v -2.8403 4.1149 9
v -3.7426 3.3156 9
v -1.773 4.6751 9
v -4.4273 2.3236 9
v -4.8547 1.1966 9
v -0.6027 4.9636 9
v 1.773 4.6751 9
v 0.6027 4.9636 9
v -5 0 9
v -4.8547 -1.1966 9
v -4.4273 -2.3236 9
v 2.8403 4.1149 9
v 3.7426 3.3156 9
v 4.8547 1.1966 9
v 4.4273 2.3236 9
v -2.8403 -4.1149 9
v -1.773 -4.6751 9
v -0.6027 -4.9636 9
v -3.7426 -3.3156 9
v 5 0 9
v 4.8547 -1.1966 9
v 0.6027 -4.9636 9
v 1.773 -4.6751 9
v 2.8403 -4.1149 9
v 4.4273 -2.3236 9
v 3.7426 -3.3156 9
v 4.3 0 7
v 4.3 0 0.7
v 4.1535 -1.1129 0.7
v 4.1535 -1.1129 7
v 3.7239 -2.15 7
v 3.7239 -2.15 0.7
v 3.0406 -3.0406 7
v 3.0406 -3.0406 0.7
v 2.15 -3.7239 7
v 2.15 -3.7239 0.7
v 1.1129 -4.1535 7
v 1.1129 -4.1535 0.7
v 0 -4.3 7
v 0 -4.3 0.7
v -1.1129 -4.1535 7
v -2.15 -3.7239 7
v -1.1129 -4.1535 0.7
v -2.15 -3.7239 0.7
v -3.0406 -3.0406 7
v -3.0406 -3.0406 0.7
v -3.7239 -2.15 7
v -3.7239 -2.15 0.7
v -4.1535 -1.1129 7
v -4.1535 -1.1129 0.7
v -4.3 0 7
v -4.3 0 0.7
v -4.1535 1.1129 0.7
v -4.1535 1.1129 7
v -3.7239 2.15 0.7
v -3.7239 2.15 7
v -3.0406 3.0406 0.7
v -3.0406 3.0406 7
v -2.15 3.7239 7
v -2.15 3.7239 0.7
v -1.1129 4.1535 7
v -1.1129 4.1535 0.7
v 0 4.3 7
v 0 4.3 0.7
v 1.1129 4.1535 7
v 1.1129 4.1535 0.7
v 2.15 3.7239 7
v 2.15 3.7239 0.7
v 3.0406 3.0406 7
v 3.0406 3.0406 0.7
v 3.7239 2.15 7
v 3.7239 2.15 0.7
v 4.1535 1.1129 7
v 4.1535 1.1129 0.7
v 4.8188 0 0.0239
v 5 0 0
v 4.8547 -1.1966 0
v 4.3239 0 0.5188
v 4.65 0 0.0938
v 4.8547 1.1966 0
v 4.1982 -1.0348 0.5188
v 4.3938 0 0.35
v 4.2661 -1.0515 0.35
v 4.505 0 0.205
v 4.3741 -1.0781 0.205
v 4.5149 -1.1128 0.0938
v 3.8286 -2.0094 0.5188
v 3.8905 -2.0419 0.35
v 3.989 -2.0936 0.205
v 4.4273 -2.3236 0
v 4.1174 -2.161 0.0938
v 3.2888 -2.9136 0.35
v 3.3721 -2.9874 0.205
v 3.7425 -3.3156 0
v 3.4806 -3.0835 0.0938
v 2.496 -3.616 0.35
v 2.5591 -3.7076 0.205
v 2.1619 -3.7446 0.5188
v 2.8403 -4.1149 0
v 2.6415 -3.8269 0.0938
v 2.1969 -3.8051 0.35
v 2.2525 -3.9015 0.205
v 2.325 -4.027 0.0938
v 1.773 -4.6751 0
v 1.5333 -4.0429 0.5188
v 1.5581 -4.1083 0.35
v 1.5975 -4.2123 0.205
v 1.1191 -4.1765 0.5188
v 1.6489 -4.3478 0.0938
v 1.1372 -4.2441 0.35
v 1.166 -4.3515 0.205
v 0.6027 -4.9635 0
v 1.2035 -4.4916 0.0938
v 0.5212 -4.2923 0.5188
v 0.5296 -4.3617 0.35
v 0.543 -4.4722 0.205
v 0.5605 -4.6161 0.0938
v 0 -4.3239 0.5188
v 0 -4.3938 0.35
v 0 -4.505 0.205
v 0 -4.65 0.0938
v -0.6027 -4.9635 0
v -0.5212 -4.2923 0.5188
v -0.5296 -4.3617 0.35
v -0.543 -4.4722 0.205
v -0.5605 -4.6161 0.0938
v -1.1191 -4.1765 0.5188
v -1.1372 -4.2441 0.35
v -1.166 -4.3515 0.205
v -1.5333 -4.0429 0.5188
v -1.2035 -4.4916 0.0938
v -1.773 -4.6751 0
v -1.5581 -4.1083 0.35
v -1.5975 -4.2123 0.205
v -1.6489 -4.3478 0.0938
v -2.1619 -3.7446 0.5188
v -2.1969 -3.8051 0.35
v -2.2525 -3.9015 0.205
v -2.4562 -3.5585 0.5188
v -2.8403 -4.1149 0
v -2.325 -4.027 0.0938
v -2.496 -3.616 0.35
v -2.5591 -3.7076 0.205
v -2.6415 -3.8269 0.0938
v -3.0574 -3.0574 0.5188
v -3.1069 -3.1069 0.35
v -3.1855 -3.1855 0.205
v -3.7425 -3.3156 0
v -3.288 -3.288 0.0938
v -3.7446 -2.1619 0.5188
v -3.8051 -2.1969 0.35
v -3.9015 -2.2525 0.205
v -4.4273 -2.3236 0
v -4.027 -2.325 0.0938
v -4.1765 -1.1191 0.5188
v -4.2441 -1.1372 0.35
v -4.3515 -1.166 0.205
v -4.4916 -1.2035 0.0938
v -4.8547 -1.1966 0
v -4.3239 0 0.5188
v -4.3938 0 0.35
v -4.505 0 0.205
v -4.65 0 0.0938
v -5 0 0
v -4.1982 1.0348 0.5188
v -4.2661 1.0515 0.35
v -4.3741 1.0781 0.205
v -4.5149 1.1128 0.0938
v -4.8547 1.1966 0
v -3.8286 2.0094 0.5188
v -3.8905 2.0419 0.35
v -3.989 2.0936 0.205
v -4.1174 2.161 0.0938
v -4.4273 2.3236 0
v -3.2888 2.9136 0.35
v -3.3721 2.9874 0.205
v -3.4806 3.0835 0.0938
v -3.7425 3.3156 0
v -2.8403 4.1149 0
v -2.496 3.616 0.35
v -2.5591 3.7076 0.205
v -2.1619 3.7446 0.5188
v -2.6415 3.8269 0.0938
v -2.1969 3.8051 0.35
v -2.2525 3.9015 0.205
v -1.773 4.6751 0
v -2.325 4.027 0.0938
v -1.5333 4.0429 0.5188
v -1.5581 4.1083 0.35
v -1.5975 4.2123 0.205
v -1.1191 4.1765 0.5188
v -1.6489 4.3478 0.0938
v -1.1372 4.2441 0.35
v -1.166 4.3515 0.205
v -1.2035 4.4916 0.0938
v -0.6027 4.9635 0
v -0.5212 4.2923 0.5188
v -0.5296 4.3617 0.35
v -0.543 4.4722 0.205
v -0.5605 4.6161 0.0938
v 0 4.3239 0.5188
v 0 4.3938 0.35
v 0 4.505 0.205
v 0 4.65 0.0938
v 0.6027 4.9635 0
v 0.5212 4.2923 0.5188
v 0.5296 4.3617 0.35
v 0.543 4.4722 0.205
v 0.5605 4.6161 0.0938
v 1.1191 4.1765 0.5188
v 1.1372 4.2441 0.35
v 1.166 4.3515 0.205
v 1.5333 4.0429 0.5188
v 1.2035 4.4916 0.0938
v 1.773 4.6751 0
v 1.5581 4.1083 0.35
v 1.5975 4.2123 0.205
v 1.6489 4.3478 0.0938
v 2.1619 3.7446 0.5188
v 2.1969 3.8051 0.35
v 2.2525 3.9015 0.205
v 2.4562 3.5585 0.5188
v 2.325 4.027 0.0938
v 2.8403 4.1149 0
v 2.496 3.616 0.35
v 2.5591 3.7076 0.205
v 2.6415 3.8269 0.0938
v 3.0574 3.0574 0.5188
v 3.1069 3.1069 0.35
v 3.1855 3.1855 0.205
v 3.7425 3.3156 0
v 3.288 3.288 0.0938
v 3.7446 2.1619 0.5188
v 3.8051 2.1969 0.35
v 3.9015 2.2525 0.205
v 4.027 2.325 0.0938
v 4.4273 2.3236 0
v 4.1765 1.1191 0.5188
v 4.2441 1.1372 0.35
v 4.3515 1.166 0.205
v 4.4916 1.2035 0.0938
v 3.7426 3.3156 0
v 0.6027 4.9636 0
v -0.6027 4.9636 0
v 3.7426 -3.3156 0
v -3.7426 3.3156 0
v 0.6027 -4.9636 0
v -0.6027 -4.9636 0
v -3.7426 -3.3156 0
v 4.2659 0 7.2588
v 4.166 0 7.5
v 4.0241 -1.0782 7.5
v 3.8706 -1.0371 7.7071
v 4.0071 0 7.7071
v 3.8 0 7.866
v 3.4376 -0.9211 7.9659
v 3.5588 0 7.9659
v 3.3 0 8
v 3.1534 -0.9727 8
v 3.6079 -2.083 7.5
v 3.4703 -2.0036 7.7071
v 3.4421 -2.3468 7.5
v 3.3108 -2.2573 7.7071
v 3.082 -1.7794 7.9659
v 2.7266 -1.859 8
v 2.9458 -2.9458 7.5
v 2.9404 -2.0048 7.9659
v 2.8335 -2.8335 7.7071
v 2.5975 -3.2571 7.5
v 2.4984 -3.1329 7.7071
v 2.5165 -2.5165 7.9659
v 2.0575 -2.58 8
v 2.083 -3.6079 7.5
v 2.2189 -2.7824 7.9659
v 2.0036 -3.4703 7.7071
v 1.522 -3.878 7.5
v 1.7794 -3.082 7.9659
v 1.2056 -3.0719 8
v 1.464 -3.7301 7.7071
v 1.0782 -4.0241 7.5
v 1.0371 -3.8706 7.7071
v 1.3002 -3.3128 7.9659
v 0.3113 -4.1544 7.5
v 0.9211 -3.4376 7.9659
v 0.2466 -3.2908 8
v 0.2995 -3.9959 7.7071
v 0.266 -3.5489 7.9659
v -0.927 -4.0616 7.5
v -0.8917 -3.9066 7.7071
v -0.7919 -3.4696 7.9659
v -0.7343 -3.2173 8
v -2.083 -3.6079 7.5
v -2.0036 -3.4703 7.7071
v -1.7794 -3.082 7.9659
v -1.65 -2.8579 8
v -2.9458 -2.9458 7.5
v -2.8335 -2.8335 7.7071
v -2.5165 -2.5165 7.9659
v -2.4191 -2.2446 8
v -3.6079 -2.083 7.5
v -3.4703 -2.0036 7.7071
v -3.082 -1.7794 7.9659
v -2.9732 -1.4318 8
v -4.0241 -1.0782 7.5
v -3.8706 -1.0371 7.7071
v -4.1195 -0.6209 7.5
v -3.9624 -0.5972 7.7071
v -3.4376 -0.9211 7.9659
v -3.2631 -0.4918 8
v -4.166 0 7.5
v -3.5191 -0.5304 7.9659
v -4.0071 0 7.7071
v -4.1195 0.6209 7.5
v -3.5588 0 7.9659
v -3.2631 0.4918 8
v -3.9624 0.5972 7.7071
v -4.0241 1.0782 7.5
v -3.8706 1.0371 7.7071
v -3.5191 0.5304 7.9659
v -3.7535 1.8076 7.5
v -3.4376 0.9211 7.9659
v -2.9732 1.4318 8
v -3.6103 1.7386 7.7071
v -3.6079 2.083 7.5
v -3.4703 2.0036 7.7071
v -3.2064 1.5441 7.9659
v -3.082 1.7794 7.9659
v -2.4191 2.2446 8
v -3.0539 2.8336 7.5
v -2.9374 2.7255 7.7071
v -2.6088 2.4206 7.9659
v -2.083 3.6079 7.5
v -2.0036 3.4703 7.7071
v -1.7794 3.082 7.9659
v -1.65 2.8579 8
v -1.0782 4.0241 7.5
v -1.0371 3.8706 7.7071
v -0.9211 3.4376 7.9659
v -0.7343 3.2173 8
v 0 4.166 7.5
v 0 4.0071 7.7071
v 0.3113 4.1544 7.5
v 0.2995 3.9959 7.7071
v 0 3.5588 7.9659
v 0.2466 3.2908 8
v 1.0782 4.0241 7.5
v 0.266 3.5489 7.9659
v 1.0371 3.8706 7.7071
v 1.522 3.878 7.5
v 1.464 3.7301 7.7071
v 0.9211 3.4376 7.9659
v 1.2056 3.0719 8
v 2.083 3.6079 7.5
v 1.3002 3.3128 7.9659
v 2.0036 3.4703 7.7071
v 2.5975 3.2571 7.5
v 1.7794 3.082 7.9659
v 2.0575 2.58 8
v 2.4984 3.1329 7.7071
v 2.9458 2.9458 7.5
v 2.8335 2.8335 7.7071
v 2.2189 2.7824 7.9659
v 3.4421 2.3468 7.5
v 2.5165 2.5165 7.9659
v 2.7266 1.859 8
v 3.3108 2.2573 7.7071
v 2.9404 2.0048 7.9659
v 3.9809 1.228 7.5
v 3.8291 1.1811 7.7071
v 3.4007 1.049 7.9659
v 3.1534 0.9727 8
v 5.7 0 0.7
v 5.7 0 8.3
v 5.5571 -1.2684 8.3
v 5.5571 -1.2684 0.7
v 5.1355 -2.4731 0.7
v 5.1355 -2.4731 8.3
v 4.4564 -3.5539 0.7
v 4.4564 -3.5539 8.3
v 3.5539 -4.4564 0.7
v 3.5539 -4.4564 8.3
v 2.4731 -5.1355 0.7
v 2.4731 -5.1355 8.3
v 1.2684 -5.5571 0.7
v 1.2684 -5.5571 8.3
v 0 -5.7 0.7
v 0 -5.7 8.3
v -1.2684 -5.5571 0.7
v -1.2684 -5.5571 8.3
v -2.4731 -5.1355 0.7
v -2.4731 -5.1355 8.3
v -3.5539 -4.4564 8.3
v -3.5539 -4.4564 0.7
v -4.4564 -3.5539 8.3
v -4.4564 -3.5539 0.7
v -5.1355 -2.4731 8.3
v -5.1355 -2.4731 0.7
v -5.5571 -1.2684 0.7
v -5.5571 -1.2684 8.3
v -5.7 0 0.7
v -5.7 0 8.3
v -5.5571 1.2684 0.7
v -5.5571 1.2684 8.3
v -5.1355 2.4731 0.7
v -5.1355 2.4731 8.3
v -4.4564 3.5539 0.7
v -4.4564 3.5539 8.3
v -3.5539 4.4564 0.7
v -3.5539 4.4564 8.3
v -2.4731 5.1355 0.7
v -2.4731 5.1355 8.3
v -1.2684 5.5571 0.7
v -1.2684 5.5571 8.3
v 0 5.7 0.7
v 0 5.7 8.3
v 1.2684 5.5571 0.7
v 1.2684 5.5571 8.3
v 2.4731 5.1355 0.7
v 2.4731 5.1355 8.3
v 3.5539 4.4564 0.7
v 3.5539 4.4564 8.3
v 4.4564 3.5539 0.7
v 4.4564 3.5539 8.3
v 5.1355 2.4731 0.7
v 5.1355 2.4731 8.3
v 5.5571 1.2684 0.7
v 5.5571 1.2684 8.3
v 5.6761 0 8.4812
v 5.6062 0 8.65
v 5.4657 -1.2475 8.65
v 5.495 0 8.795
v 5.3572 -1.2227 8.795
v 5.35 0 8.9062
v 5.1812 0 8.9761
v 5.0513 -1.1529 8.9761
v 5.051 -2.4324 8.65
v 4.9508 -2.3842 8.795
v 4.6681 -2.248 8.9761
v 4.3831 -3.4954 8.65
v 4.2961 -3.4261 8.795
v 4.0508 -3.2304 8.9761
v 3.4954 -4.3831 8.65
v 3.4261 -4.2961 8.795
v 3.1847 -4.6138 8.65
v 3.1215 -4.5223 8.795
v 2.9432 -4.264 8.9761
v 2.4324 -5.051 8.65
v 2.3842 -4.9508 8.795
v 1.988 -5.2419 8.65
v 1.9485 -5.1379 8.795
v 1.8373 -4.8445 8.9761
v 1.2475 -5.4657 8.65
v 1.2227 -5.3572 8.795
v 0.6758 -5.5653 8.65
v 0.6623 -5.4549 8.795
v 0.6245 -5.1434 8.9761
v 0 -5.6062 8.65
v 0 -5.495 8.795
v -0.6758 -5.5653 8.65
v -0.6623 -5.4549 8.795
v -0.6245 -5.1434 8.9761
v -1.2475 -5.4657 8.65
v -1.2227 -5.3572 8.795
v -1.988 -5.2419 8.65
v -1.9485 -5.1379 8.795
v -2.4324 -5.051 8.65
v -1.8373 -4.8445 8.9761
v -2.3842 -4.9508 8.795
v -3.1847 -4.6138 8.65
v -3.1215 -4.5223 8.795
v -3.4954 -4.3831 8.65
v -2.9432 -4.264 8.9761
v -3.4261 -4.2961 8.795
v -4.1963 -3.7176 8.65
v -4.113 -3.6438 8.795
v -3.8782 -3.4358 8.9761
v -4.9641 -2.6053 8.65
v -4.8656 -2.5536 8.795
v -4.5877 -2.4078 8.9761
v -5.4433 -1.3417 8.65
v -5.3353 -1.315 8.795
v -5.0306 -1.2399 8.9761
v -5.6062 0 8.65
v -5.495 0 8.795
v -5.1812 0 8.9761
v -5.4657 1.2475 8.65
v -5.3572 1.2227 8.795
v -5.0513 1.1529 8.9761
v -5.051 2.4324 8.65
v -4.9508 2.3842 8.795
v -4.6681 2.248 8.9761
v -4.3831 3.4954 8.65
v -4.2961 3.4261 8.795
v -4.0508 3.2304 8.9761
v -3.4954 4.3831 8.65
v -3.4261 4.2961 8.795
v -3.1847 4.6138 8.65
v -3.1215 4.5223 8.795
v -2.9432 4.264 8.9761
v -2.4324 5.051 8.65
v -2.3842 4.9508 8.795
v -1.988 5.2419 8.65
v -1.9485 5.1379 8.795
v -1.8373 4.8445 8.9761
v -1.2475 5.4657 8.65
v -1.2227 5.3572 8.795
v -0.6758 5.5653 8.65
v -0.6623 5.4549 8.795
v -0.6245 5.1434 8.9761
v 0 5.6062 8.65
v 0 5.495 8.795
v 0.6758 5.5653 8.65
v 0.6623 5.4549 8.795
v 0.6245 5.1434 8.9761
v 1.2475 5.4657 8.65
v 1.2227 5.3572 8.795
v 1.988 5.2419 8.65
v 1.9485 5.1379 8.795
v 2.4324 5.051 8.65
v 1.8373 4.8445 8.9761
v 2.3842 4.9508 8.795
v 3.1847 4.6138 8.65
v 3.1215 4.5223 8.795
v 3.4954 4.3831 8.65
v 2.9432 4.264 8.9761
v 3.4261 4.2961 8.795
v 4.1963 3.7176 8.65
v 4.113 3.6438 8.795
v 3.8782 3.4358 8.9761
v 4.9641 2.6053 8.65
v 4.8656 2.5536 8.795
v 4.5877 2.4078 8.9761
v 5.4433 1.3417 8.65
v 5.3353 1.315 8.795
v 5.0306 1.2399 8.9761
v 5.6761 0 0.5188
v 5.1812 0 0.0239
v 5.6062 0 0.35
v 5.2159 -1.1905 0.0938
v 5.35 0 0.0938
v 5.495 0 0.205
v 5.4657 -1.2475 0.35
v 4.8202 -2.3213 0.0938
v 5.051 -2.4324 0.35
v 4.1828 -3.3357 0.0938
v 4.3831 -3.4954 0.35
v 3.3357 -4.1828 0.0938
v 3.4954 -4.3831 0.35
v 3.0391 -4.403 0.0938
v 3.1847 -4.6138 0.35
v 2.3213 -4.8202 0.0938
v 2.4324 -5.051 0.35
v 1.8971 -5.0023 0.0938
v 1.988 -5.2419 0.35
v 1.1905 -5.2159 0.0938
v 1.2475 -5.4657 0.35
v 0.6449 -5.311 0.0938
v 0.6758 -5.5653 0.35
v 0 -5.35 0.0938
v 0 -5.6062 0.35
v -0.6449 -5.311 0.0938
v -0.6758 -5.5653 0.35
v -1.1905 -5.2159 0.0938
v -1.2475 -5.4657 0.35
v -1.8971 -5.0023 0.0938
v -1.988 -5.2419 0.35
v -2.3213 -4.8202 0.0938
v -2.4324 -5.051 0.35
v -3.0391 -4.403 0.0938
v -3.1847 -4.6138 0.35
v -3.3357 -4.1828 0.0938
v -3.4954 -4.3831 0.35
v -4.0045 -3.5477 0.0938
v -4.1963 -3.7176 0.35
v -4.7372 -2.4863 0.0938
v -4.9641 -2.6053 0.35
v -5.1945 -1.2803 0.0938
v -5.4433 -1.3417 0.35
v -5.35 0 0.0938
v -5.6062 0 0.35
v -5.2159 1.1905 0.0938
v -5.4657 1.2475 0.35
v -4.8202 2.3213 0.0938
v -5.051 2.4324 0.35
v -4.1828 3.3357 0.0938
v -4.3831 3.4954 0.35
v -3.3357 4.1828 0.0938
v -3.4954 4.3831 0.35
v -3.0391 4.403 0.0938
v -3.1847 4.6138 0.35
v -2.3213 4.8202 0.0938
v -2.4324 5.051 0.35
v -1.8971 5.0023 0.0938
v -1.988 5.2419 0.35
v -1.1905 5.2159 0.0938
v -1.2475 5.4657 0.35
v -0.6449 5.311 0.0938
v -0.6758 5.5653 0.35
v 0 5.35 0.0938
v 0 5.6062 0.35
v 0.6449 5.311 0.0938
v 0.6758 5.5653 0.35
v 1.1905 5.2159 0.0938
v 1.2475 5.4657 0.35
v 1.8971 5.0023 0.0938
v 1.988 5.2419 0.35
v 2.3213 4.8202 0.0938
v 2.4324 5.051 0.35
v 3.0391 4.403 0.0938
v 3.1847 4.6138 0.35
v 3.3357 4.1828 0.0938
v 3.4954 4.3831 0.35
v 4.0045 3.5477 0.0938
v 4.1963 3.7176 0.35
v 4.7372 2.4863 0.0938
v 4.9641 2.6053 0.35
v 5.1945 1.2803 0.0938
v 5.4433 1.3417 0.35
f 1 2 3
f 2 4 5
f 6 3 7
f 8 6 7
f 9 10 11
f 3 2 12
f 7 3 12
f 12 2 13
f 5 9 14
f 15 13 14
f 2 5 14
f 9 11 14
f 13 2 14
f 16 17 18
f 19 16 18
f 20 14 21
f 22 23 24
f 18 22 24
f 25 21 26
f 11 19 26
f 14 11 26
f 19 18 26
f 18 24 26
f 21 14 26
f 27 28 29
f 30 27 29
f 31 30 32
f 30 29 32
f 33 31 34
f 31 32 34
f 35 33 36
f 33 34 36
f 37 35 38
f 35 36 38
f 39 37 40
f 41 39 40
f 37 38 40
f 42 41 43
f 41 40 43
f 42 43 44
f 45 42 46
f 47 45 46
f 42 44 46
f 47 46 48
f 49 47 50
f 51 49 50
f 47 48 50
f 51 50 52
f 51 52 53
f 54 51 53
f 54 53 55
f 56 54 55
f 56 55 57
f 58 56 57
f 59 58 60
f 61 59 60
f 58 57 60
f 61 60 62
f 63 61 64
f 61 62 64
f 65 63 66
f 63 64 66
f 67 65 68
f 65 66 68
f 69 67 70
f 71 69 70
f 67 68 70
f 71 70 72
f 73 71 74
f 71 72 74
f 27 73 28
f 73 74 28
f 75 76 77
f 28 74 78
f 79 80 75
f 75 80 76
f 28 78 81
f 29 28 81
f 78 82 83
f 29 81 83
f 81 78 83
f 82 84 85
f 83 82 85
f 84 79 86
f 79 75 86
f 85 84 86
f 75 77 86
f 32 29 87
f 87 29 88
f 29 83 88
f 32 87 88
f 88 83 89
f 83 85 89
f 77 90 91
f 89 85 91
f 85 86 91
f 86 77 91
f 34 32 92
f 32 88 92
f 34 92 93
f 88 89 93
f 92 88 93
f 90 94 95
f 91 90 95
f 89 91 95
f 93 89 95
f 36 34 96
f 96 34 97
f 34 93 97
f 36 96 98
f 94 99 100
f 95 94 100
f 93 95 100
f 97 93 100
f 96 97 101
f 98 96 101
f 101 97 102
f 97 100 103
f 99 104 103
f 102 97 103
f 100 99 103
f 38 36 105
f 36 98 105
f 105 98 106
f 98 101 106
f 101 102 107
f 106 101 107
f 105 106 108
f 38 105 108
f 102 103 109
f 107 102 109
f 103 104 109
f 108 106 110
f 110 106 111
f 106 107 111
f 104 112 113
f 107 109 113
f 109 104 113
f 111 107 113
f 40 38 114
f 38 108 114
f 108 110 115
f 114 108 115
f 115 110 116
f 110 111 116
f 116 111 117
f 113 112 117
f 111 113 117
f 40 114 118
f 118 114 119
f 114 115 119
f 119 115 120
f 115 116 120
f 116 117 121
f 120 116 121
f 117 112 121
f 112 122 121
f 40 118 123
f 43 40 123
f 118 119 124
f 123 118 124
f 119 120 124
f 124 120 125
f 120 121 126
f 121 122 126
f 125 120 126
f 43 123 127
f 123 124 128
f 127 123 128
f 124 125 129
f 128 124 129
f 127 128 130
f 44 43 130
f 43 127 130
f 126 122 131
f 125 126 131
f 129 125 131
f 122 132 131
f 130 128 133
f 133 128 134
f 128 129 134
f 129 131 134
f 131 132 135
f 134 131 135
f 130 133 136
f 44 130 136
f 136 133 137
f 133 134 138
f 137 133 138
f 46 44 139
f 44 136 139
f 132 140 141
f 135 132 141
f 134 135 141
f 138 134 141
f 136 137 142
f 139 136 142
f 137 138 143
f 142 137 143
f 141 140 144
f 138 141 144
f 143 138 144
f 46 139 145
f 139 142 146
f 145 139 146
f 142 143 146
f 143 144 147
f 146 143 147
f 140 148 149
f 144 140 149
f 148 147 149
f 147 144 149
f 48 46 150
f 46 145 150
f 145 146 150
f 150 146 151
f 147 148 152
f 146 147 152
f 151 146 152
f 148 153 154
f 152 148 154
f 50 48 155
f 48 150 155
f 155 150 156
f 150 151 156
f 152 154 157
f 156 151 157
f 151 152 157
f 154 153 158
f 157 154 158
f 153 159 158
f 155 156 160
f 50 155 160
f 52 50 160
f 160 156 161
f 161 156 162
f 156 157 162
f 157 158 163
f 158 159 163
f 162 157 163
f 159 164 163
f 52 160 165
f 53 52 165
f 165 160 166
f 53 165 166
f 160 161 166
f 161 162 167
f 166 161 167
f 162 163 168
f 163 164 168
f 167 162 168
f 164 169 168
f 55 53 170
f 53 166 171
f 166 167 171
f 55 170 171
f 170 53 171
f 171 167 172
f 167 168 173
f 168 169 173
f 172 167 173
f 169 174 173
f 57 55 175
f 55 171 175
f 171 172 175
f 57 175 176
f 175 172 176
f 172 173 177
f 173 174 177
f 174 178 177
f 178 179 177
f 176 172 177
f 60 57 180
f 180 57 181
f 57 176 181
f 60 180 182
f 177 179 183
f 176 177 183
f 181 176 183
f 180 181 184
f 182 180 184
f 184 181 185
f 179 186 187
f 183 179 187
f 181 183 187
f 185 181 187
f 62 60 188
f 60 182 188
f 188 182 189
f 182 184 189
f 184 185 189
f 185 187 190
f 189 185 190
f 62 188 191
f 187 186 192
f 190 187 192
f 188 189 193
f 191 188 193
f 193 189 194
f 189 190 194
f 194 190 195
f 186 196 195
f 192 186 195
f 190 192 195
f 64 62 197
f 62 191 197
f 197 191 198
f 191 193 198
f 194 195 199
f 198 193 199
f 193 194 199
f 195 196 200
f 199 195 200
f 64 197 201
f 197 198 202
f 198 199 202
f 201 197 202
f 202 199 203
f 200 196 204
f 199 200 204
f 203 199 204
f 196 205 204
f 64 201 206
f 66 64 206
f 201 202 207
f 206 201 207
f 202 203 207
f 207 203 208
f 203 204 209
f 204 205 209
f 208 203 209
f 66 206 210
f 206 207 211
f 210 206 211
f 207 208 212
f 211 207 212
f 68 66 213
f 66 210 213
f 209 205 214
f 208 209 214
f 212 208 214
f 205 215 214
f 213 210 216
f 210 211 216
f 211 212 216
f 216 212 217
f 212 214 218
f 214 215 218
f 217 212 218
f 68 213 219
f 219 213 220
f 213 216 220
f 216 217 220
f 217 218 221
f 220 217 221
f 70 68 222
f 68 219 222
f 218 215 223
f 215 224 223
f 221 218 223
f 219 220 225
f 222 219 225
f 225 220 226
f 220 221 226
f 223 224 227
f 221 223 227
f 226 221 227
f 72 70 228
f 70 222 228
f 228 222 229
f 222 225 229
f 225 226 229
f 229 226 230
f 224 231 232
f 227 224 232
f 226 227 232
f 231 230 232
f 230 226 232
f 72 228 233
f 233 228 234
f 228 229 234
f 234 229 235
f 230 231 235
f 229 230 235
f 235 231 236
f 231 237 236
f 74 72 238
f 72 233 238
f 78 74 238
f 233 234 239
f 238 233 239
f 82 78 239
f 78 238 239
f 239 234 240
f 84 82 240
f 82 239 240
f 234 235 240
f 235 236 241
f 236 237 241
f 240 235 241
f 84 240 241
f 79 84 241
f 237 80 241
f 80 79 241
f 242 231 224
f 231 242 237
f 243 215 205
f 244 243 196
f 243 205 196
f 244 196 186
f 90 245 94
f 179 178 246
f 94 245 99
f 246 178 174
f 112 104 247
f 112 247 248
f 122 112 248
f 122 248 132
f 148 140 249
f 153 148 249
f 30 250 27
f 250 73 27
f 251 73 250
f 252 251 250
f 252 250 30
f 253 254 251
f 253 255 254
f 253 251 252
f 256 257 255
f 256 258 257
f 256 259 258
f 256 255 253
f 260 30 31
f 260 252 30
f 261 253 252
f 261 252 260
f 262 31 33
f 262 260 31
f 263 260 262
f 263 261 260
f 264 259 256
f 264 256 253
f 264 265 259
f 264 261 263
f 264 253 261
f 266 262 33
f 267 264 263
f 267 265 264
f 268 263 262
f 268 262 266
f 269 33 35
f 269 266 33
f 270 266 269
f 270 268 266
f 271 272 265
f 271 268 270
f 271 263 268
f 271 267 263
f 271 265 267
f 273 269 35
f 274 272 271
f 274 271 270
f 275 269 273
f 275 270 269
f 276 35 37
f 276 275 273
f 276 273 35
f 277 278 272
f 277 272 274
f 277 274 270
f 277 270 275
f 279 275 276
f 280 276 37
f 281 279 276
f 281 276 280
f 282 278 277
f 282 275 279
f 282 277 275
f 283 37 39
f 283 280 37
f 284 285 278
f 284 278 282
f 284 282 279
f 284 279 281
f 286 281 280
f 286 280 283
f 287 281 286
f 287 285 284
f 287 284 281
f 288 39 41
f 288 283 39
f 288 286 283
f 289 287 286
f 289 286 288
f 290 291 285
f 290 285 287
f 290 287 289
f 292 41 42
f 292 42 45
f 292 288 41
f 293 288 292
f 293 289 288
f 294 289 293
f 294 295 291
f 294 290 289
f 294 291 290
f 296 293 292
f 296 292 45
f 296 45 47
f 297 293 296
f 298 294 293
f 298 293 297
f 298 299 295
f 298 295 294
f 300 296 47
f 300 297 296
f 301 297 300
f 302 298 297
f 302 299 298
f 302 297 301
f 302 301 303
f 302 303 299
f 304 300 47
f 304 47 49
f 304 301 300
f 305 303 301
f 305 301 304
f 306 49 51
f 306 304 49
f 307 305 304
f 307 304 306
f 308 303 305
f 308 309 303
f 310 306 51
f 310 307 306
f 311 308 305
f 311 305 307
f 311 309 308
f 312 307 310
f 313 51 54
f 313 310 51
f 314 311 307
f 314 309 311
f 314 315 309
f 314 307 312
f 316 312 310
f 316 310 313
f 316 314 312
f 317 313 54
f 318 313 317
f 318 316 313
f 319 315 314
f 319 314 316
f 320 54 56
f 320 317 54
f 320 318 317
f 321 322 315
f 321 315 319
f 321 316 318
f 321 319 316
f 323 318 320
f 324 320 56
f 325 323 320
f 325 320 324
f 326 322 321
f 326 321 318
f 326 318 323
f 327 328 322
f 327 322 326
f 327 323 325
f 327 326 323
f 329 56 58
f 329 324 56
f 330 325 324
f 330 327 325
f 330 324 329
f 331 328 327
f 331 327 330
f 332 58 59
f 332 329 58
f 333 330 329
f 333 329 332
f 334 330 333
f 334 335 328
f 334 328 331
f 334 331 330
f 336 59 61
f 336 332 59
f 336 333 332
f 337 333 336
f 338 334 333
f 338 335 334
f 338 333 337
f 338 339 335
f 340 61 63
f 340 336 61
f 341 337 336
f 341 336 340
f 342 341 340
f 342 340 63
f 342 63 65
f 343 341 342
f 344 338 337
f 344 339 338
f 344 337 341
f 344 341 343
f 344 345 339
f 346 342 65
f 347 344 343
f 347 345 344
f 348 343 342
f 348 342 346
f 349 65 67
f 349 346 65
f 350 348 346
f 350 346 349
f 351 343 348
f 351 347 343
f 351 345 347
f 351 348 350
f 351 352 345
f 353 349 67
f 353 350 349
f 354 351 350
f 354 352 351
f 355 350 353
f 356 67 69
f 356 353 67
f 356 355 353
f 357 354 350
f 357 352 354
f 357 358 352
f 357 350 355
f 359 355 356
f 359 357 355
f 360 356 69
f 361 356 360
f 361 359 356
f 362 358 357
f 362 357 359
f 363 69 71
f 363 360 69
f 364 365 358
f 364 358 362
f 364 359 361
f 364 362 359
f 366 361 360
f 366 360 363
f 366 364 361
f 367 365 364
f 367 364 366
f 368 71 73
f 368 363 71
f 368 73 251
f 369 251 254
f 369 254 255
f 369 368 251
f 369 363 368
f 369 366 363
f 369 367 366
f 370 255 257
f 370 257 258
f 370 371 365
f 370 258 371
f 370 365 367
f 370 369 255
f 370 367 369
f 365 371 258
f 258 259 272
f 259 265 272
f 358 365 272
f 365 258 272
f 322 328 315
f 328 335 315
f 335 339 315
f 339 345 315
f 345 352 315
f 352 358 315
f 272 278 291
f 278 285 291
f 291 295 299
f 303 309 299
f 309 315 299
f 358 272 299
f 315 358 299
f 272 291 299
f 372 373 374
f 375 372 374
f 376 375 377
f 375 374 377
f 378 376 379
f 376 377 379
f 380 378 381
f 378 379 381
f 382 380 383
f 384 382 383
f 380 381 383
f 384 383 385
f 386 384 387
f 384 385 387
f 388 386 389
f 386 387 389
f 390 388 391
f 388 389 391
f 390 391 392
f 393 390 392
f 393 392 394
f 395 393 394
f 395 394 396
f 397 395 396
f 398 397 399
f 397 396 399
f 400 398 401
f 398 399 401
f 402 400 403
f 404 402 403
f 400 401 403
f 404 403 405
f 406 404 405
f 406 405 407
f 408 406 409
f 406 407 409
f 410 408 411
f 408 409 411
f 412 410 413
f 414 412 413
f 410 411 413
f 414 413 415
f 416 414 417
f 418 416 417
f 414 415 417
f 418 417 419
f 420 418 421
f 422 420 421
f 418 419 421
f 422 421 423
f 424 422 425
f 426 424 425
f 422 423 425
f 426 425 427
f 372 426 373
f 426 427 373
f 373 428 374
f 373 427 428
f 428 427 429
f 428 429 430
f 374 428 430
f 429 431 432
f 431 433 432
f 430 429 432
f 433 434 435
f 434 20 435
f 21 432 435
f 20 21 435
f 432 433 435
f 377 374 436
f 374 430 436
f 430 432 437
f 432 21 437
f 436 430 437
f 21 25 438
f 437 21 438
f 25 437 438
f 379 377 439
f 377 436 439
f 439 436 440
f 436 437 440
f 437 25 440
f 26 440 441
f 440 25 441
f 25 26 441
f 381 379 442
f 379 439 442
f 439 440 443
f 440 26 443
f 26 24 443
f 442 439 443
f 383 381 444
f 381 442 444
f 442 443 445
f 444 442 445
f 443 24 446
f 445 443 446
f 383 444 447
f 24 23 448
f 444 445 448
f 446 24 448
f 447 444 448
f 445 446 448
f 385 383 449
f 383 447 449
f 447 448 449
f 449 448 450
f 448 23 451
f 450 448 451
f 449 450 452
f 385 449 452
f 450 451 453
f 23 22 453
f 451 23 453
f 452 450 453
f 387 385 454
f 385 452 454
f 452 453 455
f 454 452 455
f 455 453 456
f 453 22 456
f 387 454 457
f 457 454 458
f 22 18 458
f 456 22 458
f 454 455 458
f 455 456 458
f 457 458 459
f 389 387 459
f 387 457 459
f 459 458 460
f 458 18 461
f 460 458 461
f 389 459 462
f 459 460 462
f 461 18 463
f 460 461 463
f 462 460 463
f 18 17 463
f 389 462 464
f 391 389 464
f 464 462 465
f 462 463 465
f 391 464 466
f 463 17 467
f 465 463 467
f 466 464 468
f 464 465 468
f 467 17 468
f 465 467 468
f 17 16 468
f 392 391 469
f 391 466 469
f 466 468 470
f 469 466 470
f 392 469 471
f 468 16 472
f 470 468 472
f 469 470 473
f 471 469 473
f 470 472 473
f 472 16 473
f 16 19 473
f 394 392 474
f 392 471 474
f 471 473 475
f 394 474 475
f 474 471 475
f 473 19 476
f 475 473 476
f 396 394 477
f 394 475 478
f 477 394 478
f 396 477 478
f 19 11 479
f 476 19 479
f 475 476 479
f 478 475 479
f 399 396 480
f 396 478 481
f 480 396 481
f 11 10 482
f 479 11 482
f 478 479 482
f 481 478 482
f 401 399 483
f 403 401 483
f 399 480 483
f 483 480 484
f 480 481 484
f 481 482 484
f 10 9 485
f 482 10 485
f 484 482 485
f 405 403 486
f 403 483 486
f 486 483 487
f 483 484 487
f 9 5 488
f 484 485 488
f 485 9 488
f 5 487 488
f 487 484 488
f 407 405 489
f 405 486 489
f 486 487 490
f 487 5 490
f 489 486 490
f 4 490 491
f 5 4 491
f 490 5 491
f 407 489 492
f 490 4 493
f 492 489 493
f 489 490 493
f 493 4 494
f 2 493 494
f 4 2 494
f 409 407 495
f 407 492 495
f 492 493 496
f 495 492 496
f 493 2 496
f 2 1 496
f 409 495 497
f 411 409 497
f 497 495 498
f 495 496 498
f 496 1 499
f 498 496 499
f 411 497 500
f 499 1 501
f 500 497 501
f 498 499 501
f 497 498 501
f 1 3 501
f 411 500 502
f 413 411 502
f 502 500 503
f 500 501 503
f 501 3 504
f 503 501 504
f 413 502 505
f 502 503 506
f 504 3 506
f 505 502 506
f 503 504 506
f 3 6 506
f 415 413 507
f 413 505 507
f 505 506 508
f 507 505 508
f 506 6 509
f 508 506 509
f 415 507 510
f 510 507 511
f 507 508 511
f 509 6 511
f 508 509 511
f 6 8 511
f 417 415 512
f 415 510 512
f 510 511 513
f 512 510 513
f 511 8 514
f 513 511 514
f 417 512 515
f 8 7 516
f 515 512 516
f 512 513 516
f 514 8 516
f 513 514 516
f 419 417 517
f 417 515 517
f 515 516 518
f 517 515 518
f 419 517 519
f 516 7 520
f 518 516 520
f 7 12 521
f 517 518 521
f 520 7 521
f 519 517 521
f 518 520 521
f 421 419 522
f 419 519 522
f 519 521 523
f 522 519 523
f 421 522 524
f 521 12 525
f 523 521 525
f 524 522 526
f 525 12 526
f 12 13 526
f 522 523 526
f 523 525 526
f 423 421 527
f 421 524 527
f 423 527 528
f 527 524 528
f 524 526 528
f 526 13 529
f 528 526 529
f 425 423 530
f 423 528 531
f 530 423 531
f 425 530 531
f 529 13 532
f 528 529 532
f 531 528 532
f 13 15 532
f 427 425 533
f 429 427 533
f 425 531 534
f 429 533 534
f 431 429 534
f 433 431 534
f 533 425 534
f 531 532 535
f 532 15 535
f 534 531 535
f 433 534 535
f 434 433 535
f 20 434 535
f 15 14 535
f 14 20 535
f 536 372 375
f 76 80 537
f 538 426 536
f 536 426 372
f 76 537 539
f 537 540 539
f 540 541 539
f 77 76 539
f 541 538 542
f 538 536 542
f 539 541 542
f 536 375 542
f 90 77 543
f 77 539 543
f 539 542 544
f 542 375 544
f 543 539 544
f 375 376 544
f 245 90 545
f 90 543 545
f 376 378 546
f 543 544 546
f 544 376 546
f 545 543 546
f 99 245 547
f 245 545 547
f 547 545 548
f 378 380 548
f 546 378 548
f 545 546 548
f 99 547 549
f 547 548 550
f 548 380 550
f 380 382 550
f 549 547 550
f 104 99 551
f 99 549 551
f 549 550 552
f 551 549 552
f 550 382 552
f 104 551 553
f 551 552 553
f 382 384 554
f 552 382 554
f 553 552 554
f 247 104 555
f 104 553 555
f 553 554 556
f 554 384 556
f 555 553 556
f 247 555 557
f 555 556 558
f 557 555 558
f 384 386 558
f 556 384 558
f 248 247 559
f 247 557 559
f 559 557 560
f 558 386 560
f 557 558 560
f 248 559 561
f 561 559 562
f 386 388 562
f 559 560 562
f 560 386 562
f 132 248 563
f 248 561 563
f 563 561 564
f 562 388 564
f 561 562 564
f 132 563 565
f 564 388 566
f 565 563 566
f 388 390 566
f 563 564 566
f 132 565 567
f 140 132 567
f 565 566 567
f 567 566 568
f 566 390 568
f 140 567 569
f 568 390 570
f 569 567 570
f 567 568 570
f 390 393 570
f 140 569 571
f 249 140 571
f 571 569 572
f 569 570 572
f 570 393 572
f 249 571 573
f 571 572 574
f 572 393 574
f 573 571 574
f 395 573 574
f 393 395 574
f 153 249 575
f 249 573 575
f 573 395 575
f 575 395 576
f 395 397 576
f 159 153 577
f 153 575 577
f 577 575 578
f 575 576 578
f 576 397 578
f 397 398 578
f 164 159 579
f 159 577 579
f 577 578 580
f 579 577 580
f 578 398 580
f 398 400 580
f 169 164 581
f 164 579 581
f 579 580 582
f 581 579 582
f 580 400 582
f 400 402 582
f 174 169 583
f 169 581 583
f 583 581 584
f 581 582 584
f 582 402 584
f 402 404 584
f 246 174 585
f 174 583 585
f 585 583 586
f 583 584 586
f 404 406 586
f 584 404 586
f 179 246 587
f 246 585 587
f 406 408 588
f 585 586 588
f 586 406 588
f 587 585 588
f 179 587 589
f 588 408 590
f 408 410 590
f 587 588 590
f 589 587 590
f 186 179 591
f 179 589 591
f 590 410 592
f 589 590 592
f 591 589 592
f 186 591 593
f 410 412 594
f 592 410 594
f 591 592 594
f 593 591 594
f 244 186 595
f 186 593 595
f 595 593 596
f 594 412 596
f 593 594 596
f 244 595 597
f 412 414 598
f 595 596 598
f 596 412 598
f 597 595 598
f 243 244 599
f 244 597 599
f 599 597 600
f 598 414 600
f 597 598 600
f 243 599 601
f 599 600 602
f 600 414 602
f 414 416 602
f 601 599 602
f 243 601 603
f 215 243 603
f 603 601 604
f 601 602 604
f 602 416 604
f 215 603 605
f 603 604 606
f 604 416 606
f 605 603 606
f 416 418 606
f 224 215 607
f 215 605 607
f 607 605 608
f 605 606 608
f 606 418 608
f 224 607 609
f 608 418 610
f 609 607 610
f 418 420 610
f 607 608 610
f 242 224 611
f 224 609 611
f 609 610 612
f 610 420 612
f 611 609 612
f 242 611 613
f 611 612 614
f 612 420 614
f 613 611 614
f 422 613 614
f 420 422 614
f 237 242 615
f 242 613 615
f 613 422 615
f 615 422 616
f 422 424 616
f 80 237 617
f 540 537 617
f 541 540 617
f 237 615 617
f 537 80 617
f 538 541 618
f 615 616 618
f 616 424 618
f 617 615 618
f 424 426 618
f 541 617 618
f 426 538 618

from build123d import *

# Parameters (mm, degrees)
F2_R = 0.69999
F3_R = 1


# Not quite as in the source:
# - a fillet or chamfer is up to 0.001 mm smaller than in the source, because OpenCascade refuses the exact size


with BuildPart() as f1:
    # F0 (on Front) → F1 (revolve)
    with BuildSketch(Plane.XZ):
        Polygon((0, 9), (0, 8), (4.3, 8), (4.3, 0), (5.7, 0), (5.7, 9), align=None)
    revolve(axis=Axis((0, 0, 8.5), (0, 0, -1)))

    # F2 (radius 0.7 in the source; OpenCascade refuses exactly that, so slightly less here)
    f2_edges = [f1.edges().sort_by_distance(p)[0] for p in [
        (-5.7, 0, 0),
        (-4.3, 0, 0),
        (-5.7, 0, 9),
    ]]
    fillet(f2_edges, radius=F2_R)

    # F3
    f3_edges = [f1.edges().sort_by_distance(p)[0] for p in [
        (-4.3, 0, 8),
    ]]
    fillet(f3_edges, radius=F3_R)


solid = f1.part
